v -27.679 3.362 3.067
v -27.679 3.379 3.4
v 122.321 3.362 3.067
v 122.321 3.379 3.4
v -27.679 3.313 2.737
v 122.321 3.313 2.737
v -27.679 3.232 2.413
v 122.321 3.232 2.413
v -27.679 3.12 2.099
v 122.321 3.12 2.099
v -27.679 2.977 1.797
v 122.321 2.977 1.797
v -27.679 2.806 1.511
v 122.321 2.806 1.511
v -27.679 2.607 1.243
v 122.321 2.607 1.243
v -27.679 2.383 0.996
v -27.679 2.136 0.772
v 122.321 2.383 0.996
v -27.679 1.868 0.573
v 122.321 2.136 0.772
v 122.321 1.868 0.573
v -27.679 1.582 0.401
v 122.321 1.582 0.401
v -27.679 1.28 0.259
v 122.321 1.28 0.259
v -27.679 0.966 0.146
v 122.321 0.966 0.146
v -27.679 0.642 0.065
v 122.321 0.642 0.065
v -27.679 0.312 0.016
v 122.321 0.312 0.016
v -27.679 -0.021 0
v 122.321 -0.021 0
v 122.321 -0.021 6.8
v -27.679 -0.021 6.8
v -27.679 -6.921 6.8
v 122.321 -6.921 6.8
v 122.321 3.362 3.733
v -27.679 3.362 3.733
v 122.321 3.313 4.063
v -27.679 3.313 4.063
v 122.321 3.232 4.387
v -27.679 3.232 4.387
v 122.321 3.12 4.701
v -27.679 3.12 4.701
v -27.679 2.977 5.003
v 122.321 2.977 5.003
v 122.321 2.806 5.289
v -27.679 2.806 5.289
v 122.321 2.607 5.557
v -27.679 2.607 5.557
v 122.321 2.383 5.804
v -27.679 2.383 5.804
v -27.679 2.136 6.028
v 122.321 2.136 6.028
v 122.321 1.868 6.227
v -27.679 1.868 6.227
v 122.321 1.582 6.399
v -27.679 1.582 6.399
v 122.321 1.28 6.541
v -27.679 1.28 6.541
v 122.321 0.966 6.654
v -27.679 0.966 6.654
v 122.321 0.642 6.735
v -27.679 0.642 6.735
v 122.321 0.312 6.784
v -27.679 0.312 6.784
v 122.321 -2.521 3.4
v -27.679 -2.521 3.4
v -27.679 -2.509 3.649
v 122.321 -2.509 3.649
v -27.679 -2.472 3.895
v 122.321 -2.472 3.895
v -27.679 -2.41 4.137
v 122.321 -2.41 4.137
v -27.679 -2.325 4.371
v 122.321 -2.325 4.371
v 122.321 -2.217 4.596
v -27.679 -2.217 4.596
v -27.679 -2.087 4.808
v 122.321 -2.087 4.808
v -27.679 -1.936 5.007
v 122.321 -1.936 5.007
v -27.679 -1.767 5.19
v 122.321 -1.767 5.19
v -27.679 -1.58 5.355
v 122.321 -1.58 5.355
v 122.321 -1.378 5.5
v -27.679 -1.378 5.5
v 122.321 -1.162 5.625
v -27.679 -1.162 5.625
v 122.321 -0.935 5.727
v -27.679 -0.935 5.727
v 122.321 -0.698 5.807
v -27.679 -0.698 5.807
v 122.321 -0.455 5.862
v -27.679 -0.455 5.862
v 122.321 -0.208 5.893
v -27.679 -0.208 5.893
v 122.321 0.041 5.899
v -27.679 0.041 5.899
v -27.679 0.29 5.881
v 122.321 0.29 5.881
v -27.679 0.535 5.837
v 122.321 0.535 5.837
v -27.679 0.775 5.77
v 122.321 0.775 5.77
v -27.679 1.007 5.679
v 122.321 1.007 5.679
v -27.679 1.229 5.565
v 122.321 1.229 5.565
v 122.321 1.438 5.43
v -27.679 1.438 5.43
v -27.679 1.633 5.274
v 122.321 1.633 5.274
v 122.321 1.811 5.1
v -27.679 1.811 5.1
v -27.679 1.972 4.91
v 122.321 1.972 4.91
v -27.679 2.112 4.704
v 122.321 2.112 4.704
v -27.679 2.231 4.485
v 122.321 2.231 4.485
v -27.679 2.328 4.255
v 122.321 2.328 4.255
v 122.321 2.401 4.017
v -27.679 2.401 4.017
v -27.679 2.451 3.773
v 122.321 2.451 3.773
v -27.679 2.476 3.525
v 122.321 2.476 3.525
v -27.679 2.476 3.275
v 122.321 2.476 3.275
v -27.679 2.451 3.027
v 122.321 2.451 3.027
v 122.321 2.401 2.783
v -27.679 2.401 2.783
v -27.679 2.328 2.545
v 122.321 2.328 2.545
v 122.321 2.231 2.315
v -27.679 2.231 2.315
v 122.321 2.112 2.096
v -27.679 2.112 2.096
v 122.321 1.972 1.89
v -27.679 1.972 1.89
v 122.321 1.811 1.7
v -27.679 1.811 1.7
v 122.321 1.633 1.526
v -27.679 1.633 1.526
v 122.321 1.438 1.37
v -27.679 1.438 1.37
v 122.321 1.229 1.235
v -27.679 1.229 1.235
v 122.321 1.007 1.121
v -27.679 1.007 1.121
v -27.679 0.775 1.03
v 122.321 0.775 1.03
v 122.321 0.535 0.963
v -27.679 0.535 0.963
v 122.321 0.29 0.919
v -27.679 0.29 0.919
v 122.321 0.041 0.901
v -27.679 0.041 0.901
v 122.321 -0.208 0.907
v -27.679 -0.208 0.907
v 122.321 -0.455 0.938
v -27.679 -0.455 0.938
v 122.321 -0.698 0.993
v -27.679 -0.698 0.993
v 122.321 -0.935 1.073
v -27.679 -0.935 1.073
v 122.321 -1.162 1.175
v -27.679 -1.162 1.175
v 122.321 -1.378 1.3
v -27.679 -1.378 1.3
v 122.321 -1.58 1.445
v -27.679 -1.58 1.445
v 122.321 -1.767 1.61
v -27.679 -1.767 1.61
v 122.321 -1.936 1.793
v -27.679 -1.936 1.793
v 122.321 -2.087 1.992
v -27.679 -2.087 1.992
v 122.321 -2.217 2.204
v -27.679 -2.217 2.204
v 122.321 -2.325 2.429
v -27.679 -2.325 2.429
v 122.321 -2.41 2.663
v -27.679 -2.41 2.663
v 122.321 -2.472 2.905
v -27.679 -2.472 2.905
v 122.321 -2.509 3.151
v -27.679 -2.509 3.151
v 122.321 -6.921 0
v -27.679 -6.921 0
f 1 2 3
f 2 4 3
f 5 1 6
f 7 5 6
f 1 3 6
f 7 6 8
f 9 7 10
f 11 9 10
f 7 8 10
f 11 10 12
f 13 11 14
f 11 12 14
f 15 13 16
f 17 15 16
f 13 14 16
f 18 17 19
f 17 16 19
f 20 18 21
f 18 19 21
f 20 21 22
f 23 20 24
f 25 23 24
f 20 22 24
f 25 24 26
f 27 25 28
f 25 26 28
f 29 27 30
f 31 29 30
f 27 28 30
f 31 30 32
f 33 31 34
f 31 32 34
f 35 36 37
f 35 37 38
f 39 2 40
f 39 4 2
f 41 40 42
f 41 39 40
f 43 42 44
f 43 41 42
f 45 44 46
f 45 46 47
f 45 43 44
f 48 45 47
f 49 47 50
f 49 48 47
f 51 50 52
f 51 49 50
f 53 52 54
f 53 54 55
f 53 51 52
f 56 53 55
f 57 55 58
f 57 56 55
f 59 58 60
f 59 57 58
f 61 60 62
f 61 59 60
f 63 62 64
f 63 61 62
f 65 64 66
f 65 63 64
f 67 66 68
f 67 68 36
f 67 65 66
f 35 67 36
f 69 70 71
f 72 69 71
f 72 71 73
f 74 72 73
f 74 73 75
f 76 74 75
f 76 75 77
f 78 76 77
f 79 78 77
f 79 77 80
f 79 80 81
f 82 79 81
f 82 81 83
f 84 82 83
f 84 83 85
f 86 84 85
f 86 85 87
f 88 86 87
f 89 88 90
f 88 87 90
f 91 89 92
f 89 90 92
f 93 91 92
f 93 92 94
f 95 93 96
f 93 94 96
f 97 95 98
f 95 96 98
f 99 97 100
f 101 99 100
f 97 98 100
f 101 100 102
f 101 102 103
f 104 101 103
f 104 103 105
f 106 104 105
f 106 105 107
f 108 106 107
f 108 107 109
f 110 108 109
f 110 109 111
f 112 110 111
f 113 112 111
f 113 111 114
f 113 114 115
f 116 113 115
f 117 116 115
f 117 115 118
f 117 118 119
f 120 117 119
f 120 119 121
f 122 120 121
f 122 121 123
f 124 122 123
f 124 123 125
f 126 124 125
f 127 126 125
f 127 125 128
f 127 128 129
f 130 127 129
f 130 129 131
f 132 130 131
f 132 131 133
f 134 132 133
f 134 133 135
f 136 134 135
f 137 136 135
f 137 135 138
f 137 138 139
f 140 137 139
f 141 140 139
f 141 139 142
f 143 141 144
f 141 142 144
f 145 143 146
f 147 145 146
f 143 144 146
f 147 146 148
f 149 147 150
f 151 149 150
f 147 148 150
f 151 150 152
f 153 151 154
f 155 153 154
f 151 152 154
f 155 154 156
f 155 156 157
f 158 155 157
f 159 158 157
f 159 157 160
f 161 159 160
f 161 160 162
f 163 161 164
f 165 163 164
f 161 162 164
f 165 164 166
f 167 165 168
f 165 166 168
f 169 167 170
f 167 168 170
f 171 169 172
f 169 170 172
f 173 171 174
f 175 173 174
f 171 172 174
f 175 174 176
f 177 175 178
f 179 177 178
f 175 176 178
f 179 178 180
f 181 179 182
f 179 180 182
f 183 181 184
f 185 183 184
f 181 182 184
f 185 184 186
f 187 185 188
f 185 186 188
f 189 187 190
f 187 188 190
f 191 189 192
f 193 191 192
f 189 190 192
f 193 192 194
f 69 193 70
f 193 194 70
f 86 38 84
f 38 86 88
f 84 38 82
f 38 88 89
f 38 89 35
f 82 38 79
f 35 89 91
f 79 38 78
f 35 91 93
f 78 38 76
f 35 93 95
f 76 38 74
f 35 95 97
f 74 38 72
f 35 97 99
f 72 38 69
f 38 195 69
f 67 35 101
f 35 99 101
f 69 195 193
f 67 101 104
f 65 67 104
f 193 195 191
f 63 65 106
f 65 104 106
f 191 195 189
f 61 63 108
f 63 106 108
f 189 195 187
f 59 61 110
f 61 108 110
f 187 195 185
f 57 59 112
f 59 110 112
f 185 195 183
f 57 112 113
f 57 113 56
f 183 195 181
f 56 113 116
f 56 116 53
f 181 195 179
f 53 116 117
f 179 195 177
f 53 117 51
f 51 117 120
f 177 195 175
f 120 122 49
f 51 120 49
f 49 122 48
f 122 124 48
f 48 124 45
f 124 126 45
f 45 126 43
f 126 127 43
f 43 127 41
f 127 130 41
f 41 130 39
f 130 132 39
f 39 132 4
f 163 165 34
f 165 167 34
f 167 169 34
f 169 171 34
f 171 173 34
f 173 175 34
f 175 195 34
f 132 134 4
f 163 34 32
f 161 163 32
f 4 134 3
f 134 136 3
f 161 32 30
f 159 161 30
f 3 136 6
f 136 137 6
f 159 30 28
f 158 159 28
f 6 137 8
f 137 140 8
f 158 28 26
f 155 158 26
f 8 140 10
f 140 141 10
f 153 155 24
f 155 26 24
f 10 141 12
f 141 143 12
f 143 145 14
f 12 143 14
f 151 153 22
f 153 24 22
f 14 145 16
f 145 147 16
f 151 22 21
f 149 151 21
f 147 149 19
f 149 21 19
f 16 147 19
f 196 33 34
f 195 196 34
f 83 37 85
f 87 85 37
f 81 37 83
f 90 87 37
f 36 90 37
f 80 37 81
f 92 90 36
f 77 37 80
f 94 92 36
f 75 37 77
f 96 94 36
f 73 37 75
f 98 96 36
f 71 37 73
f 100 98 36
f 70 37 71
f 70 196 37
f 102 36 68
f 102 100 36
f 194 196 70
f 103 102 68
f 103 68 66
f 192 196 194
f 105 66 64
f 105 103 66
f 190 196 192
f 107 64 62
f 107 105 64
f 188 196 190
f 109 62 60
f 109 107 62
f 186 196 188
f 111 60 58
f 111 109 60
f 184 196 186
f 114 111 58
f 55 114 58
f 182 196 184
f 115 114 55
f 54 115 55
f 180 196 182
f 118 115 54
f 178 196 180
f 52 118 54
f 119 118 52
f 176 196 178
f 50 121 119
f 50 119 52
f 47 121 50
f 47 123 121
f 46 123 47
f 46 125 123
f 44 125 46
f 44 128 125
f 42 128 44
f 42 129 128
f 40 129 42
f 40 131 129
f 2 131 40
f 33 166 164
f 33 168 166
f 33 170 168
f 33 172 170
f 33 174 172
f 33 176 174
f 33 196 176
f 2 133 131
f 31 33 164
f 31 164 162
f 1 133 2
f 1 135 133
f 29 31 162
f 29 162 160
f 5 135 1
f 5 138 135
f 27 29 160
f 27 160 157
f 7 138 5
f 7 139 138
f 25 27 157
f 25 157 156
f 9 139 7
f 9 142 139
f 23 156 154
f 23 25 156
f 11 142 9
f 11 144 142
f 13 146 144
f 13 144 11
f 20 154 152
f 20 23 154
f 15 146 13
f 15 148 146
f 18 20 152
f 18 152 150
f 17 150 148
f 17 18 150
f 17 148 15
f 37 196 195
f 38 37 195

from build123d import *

# Parameters (mm, degrees)
F0_W     = 150
F0_H     = 10.3
F1_DEPTH = 6.8
F2_R     = 3.39999
F3_R     = 2.5
F4_DEPTH = 150.001


# Not quite as in the source:
# - a fillet or chamfer is up to 0.001 mm smaller than in the source, because OpenCascade refuses the exact size


with BuildPart() as f1:
    # F0 (on Top) → F1 (new body)
    with BuildSketch(Plane.XY):
        with Locations((47.3209783435, -1.7712331437)):
            Rectangle(F0_W, F0_H)
    extrude(amount=F1_DEPTH)

    # F2 (radius 3.4 in the source; OpenCascade refuses exactly that, so slightly less here)
    f2_edges = [f1.edges().sort_by_distance(p)[0] for p in [
        (47.320978, 3.378767, 6.8),
        (47.320978, 3.378767, 0),
    ]]
    fillet(f2_edges, radius=F2_R)

    # F3 (on face) → F4 (cut, through all)
    with BuildSketch(Plane(origin=(-27.6790216565, 0, 0), x_dir=(0, -1, 0), z_dir=(-1, 0, 0))):
        with Locations((0.0212331437, 3.4)):
            Circle(F3_R)
    extrude(amount=-F4_DEPTH, mode=Mode.SUBTRACT)


solid = f1.part
